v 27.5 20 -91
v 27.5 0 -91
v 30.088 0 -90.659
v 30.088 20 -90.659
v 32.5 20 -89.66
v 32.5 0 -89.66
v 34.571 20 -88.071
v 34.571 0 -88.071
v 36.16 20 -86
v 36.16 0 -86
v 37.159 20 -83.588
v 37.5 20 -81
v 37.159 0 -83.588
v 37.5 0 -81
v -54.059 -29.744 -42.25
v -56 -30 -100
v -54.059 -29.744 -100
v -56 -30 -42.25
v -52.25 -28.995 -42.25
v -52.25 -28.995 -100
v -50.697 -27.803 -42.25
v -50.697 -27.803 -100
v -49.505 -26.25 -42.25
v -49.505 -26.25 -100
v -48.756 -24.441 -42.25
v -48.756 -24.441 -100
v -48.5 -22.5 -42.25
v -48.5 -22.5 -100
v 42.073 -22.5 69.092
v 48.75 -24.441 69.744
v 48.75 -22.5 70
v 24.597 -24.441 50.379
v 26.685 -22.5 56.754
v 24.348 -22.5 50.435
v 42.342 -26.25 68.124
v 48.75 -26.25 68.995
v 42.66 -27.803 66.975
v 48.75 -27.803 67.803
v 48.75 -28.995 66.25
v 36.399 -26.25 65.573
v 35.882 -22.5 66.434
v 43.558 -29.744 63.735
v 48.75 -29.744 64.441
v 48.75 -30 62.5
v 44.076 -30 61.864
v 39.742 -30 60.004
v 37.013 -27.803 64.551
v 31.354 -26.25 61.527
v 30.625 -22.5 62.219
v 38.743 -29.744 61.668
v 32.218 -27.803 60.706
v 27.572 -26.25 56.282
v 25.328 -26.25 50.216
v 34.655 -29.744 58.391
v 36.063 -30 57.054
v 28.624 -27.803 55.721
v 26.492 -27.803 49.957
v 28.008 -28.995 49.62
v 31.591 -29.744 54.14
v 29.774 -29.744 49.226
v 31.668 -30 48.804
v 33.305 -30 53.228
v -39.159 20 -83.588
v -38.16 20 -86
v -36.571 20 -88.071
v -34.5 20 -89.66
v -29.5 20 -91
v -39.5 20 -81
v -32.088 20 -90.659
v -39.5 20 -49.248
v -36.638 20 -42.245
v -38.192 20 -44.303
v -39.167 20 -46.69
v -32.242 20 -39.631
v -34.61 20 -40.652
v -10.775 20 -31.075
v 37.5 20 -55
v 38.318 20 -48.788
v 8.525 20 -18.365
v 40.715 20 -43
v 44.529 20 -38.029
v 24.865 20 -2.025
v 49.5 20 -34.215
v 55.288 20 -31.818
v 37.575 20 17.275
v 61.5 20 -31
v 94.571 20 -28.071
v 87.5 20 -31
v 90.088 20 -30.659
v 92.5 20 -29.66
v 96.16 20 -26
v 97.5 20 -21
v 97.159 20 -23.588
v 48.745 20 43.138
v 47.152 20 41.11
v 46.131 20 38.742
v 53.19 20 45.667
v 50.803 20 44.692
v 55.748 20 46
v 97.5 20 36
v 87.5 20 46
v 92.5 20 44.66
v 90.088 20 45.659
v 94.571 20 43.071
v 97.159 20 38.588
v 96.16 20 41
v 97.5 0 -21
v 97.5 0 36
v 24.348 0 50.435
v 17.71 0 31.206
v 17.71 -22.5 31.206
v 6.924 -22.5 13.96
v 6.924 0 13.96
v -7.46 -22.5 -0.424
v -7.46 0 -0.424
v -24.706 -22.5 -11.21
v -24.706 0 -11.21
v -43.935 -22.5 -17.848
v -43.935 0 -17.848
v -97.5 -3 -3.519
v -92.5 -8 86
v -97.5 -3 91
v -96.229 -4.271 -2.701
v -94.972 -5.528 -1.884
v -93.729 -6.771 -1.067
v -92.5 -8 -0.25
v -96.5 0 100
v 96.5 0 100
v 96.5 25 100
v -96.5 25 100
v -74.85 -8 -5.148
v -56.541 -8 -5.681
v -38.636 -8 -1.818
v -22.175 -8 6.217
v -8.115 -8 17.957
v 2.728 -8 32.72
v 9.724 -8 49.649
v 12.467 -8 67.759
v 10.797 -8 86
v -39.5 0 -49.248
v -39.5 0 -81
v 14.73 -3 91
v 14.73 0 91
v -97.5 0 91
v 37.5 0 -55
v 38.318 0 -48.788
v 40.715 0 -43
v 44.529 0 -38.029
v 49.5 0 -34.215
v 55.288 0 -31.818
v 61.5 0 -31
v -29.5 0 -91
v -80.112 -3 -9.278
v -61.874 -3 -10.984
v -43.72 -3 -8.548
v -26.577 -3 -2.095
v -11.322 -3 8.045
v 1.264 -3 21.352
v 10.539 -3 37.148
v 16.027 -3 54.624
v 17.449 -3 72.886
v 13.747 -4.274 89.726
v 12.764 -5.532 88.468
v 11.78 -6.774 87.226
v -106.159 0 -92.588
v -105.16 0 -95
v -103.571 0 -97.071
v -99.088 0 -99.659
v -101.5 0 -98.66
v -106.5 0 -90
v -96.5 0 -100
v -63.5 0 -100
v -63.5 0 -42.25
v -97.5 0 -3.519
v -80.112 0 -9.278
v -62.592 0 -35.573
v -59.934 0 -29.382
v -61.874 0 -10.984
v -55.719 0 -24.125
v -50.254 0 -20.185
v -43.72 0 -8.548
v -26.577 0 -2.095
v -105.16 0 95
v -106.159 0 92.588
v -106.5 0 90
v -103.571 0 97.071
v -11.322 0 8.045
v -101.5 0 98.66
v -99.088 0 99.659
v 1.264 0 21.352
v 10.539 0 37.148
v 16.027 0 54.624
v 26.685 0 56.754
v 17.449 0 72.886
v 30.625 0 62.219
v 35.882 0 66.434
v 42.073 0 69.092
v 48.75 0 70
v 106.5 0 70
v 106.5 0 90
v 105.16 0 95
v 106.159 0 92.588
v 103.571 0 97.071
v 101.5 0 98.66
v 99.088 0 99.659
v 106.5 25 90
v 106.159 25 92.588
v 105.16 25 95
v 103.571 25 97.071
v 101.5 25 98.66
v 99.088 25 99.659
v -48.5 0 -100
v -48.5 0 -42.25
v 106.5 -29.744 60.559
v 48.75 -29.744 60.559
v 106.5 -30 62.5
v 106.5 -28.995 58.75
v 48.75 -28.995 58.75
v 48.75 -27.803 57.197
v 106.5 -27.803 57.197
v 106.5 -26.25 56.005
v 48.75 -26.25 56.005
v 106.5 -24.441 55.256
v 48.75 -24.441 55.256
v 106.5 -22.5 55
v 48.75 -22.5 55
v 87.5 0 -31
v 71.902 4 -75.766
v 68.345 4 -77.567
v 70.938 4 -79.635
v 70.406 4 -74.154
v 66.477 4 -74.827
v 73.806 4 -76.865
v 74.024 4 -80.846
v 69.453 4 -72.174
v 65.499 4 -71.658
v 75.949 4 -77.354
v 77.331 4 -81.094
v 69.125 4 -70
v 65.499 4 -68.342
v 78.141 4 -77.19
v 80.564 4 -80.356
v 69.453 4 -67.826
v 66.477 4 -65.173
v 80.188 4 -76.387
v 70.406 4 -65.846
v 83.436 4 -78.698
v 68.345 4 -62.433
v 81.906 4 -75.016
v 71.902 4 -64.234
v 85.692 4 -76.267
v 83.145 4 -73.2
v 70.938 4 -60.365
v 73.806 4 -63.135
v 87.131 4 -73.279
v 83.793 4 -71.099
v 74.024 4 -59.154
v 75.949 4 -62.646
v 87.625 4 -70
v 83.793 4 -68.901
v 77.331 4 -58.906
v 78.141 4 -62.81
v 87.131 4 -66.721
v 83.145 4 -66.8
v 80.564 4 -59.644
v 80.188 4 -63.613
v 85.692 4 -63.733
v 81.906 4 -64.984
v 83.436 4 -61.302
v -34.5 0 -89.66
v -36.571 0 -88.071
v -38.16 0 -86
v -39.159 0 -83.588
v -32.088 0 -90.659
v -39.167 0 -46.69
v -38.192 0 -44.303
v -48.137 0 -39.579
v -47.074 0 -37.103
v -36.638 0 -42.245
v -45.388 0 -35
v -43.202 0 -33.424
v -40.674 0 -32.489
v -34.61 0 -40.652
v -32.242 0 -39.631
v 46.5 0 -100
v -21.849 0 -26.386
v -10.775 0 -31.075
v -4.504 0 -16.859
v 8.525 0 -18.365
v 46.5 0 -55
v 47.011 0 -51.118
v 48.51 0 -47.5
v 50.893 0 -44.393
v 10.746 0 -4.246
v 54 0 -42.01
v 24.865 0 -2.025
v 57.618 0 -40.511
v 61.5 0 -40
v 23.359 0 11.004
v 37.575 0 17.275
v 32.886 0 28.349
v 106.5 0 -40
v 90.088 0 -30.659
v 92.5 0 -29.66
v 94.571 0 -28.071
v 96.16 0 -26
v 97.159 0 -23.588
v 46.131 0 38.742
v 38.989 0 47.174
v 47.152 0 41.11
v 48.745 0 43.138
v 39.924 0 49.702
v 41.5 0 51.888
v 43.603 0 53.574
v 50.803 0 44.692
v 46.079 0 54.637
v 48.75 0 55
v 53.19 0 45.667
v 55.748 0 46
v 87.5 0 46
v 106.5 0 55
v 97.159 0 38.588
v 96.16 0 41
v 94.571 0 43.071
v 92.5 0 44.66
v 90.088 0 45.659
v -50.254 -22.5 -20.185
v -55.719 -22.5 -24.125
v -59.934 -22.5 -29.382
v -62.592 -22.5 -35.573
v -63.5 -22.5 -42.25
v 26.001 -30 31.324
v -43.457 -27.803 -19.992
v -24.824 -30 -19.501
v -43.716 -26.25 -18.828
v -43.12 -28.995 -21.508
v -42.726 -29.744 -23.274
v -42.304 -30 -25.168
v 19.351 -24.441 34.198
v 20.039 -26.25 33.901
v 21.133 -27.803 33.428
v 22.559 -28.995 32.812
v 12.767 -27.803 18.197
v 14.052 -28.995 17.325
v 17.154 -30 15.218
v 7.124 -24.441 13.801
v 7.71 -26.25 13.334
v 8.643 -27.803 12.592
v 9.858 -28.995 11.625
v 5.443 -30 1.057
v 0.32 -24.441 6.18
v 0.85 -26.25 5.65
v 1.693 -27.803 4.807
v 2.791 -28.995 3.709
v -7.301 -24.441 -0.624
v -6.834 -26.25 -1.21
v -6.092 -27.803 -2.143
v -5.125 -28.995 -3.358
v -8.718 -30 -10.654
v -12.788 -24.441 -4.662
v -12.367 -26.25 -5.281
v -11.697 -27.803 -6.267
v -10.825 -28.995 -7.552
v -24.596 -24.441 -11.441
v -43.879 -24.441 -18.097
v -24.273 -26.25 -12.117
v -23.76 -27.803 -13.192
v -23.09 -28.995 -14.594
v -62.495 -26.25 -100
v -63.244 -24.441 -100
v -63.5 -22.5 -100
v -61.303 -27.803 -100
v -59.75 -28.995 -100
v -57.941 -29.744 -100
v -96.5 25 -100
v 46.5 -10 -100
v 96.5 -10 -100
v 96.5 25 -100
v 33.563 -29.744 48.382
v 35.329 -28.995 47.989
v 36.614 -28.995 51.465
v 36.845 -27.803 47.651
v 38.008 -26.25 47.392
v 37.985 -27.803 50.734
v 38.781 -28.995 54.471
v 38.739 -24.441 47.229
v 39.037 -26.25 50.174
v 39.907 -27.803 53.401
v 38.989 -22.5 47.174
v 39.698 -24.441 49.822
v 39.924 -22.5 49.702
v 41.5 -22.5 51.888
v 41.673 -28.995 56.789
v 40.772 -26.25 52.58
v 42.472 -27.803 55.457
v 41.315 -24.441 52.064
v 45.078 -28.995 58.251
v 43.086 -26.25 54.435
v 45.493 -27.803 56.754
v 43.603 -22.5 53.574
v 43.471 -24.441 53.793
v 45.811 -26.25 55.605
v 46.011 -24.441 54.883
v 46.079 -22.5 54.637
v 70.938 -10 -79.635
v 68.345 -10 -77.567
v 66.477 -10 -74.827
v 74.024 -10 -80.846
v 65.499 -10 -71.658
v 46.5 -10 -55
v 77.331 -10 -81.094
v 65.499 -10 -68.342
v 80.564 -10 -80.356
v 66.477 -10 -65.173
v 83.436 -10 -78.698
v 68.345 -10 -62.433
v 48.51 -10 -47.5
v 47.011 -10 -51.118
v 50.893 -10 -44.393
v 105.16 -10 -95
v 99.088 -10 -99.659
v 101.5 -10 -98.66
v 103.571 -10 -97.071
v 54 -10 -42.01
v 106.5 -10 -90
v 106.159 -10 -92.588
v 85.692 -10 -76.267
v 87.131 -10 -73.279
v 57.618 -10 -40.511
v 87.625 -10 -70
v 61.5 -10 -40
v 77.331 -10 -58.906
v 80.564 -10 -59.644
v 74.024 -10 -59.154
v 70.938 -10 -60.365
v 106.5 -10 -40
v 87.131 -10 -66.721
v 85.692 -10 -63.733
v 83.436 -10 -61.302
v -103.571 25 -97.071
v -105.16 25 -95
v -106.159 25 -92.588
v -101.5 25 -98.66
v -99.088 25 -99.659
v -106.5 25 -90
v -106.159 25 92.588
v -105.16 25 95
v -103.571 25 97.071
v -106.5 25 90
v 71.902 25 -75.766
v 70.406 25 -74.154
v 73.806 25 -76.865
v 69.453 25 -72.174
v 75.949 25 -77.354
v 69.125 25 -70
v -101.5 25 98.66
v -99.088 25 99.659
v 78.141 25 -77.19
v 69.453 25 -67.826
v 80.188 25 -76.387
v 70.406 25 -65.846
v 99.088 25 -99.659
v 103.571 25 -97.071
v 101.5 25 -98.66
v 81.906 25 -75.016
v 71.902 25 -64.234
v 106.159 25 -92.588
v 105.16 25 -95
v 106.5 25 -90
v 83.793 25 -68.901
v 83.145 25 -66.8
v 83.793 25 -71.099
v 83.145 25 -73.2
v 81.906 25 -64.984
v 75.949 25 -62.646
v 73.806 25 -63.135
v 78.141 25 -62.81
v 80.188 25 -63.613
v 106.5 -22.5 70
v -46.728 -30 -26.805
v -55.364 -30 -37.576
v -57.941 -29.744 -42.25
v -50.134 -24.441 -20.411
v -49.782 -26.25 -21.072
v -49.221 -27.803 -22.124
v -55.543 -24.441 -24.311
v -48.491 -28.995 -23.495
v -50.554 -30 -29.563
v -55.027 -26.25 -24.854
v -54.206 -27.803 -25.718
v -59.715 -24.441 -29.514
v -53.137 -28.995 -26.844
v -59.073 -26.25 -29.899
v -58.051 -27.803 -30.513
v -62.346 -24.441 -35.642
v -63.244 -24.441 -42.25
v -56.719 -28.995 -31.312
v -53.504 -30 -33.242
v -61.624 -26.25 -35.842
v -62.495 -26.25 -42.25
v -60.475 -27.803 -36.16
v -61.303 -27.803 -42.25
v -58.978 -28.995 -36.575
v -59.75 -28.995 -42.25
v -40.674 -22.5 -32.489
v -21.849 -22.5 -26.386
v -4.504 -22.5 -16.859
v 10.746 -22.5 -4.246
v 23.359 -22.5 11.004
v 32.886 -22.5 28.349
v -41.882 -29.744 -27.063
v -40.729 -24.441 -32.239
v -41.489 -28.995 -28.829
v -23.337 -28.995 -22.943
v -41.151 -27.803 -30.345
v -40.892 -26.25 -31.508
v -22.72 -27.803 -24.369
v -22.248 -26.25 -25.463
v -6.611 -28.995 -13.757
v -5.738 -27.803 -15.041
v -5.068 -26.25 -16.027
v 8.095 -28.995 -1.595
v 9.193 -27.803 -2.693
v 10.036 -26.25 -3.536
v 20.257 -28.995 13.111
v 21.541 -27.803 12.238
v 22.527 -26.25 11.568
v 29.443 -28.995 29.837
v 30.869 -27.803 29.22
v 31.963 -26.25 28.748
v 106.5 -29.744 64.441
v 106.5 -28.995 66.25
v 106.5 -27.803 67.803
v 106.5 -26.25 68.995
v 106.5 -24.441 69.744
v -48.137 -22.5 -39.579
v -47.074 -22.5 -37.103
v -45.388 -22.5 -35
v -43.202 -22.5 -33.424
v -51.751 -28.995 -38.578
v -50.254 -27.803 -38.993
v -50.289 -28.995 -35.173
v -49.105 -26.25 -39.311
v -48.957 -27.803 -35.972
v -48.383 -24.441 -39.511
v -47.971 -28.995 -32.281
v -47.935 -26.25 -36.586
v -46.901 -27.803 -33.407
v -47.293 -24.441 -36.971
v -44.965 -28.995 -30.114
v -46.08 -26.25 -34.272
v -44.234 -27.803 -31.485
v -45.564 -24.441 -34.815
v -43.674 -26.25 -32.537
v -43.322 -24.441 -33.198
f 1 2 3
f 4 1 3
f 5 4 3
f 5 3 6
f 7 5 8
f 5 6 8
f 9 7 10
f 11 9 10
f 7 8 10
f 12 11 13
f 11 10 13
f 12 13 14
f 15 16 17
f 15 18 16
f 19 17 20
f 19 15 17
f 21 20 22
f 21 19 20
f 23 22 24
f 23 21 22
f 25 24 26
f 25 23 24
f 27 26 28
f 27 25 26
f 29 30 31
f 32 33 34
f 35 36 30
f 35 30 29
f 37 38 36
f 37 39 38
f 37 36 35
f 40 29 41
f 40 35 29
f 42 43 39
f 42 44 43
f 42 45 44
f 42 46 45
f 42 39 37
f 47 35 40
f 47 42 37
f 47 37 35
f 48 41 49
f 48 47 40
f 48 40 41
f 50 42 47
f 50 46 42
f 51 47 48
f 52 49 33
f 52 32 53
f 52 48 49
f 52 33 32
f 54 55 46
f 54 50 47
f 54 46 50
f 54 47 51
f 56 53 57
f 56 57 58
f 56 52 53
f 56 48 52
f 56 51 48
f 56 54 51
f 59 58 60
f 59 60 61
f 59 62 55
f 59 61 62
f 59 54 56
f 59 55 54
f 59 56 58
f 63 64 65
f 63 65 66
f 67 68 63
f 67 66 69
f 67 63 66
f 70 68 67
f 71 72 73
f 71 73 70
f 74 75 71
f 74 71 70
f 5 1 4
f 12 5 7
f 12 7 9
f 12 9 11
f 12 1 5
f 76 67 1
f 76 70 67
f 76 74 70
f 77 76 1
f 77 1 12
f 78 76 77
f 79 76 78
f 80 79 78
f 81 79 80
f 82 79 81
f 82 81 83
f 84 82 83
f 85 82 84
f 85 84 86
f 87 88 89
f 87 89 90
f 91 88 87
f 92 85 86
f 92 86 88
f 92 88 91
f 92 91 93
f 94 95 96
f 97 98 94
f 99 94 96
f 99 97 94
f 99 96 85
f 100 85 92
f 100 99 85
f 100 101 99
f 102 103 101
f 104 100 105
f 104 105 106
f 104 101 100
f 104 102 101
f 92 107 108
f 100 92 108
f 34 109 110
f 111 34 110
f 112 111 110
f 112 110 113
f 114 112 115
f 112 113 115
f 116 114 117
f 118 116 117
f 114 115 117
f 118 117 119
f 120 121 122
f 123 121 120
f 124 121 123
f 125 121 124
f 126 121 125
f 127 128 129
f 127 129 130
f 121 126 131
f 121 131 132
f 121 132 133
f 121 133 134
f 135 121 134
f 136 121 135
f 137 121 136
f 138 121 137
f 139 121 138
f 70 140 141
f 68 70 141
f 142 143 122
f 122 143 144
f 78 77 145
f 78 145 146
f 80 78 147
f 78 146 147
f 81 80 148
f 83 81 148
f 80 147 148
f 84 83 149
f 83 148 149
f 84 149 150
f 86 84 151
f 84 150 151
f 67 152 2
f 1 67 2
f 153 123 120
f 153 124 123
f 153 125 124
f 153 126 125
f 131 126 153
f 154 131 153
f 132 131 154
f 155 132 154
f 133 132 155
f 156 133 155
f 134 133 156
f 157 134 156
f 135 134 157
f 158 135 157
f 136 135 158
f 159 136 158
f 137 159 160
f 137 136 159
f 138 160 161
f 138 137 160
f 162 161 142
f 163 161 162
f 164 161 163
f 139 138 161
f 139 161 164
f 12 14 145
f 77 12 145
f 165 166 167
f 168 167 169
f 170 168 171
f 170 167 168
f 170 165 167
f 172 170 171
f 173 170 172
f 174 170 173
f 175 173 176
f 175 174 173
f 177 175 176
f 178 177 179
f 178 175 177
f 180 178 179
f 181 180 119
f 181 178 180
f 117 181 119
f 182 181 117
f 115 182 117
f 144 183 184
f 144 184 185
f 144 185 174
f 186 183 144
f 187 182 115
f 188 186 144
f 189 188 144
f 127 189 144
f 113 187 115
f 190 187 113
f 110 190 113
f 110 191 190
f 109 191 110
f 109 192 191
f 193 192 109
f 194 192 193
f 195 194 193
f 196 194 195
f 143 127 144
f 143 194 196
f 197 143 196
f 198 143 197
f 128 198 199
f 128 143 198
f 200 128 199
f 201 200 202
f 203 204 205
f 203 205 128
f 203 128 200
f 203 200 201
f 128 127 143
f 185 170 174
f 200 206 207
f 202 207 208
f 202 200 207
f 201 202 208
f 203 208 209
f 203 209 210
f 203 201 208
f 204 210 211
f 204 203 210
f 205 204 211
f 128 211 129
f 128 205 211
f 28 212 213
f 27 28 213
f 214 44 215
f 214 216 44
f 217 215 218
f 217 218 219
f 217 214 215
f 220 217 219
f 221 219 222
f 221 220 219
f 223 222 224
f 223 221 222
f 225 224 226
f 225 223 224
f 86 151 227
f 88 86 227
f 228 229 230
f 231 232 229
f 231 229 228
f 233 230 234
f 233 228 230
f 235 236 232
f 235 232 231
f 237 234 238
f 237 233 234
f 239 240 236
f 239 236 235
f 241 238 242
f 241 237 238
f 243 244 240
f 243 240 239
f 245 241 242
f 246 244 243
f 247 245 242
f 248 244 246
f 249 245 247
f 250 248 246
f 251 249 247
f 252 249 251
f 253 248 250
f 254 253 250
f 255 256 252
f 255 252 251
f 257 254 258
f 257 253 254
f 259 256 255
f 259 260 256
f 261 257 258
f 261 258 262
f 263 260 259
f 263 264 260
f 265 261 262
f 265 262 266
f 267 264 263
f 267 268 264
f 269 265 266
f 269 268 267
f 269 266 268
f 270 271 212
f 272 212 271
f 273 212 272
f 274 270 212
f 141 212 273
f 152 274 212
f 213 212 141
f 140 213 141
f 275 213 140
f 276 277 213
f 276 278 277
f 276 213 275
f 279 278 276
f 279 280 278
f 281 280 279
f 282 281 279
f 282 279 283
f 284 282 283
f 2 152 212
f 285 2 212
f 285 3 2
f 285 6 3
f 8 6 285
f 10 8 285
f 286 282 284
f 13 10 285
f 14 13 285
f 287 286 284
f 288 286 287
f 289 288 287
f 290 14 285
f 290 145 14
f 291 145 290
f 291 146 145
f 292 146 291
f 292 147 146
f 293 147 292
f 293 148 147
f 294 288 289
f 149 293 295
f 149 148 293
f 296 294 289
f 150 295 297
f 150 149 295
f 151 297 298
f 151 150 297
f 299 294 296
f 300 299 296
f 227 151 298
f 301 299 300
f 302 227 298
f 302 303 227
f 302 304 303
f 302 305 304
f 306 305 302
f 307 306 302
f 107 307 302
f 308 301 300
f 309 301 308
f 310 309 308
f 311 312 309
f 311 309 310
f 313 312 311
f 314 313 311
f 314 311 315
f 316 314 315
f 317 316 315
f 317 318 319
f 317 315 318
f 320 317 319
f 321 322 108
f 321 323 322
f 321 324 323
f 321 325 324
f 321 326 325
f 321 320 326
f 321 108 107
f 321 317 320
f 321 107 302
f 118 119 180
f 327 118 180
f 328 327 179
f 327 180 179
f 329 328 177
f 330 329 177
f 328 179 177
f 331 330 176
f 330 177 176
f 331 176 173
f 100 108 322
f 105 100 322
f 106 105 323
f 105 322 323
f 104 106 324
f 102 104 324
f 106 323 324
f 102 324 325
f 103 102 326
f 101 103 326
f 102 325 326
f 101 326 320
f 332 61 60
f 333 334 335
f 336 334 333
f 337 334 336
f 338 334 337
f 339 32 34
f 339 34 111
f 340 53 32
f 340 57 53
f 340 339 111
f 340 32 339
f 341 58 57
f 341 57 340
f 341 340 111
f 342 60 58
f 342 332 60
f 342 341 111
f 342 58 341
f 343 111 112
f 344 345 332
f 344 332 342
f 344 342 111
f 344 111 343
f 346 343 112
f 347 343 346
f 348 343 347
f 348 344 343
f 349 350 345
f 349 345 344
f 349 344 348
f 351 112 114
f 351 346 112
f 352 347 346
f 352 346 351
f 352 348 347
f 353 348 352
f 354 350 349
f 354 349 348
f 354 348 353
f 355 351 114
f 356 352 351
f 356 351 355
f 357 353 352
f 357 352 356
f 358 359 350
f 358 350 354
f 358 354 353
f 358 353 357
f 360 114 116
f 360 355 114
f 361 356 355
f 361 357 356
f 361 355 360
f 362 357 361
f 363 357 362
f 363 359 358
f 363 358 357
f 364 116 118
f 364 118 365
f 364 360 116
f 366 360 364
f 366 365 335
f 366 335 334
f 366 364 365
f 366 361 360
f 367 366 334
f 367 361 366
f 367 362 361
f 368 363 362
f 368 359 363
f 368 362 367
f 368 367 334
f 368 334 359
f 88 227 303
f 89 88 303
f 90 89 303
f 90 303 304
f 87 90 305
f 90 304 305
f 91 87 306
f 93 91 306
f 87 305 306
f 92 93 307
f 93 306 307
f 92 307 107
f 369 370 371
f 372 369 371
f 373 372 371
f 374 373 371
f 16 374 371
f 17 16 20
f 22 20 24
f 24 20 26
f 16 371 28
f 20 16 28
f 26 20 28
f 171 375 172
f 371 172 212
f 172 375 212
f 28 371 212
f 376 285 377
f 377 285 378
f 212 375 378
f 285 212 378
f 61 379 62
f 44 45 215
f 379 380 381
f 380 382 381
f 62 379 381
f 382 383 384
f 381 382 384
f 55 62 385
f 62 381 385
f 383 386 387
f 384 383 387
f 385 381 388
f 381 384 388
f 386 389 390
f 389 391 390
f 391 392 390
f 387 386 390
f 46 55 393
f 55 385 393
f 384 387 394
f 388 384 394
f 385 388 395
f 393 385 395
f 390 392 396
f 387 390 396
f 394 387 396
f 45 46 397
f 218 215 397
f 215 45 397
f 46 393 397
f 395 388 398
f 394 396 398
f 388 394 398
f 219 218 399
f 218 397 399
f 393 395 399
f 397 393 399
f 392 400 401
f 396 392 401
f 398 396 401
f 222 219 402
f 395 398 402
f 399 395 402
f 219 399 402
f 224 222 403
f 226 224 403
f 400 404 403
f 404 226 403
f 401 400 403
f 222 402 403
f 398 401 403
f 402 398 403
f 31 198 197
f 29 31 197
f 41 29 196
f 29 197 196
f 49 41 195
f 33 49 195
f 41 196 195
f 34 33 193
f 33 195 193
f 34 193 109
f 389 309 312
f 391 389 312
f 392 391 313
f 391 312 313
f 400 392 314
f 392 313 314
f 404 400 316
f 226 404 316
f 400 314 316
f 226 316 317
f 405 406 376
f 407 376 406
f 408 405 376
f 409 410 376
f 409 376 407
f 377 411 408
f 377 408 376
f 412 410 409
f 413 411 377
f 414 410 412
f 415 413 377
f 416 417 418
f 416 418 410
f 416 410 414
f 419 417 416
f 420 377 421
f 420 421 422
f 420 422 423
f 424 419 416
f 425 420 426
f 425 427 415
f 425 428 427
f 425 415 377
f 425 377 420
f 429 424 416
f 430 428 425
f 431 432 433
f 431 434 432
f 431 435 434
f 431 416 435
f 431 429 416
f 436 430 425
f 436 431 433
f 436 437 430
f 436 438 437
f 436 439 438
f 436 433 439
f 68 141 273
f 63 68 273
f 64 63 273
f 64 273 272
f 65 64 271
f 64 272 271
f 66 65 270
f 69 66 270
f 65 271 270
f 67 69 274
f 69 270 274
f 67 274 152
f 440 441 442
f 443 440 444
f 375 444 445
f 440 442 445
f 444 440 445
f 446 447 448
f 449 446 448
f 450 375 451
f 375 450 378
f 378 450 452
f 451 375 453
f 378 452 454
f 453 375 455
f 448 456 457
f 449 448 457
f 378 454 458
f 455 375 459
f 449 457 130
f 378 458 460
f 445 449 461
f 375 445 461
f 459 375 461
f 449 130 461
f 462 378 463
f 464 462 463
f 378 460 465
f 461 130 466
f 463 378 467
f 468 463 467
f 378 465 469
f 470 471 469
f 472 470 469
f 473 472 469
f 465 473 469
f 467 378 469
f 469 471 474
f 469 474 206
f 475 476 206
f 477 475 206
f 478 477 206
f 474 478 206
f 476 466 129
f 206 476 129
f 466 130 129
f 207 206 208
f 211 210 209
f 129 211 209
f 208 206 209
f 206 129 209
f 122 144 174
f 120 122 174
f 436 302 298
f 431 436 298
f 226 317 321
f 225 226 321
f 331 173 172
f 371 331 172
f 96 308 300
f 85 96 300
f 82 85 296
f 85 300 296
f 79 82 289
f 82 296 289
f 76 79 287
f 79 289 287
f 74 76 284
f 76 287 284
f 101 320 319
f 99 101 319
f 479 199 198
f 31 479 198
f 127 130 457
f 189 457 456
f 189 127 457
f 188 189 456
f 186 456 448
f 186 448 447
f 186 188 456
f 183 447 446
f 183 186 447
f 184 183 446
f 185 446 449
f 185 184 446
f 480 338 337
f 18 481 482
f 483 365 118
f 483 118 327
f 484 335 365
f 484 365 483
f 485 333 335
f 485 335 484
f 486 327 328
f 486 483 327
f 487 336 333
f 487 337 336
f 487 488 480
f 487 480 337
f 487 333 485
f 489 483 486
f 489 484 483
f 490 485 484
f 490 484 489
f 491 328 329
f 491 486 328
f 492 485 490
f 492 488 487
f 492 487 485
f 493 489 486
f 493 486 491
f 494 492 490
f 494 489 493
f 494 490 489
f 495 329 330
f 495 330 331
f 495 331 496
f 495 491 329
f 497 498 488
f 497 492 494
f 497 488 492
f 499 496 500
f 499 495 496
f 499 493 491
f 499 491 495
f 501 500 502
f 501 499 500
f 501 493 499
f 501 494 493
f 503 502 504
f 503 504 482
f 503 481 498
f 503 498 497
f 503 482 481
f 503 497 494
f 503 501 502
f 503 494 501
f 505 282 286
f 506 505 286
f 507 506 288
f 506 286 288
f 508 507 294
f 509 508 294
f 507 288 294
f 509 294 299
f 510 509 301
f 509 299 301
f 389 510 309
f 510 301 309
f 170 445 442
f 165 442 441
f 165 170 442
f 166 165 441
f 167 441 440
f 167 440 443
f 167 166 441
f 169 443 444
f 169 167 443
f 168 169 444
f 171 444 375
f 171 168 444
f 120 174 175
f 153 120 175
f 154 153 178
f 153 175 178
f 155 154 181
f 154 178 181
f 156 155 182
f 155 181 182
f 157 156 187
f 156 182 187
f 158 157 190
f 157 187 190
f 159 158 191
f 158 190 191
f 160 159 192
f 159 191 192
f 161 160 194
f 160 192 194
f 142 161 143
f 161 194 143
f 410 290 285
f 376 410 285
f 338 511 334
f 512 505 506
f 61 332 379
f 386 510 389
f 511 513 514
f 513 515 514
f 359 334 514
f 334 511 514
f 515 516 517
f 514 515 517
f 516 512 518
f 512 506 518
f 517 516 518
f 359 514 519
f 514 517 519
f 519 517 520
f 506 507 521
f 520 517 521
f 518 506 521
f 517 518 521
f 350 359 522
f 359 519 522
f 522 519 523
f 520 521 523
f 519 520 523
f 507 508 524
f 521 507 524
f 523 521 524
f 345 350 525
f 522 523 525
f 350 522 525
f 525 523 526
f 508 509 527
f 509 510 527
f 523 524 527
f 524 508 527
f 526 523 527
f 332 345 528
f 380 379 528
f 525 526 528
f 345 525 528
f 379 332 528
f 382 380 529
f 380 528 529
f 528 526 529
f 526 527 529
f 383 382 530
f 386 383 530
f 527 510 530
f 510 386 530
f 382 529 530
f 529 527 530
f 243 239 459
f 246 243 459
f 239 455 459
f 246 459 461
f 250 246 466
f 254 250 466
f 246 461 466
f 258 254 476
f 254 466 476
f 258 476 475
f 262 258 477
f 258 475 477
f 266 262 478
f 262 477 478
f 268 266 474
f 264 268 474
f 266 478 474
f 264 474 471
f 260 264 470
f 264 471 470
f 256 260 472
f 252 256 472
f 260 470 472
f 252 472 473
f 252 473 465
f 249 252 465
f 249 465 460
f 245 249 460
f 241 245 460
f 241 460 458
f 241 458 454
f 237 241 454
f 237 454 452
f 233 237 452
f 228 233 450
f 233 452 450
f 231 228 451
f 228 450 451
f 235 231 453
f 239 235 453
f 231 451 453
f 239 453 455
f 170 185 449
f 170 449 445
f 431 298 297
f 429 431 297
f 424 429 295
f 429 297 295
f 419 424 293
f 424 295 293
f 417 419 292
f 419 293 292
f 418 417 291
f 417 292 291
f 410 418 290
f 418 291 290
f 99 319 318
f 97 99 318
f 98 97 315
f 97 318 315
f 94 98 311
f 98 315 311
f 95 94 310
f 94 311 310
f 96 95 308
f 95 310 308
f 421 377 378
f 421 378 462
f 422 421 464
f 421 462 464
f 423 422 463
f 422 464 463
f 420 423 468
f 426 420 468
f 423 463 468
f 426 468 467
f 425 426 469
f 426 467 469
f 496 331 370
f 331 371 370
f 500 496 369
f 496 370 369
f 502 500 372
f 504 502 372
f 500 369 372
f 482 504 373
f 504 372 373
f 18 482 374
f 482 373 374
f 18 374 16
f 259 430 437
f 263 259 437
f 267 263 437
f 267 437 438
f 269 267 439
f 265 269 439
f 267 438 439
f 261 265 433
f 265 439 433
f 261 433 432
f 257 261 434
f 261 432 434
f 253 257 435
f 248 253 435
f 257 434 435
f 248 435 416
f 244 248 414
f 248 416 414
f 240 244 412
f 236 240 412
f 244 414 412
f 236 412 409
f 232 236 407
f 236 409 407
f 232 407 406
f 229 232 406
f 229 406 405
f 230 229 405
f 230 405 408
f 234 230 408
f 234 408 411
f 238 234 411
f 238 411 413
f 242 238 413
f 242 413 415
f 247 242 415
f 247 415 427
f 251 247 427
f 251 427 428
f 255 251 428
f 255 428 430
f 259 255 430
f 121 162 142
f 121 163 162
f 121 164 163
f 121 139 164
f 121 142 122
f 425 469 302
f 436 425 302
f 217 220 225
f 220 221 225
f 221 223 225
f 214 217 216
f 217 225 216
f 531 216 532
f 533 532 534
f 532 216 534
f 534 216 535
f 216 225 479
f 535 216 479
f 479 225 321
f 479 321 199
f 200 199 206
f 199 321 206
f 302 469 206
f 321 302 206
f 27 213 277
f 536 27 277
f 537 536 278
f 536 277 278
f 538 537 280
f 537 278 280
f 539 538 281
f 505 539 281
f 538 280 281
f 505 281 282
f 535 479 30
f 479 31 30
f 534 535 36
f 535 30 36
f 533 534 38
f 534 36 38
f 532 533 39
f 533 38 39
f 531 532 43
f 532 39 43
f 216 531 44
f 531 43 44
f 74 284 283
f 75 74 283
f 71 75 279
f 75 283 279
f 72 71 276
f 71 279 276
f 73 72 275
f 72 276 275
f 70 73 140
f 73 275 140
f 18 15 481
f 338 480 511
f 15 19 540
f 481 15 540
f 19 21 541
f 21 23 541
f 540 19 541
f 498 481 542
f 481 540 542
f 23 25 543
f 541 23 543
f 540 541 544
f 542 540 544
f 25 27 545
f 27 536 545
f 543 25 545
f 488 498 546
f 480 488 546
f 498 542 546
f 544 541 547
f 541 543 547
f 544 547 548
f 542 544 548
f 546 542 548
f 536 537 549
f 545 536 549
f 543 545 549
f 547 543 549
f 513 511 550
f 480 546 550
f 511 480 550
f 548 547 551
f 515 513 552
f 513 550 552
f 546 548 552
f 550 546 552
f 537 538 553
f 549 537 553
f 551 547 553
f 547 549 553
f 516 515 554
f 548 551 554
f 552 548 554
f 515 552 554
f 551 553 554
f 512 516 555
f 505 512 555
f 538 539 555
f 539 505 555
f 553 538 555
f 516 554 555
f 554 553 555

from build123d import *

# Parameters (mm, degrees)
F1_DEPTH       = 25
F2_DEPTH       = 10
F3_DEPTH       = 30
F4_DEPTH       = 20
F5_DEPTH       = 8
F6_SIZE2       = 5
F6_SIZE        = 5
F8_D           = 14.75
F8_CBORE_D     = 22.25
F8_CBORE_DEPTH = 14
F9_R           = 7.49999


# Not quite as in the source:
# - a fillet or chamfer is up to 0.001 mm smaller than in the source, because OpenCascade refuses the exact size


with BuildPart() as f1:
    # F0 (on Front) → F1 (new body)
    with BuildSketch(Plane.XZ):
        with BuildLine():
            Line((106.5, -40), (106.5, 55))
            Line((106.5, 55), (48.7497216032, 55))
            ThreePointArc((48.7497216032, 55), (42.4942891815, 52.8018949761), (38.9888762464, 47.1739130435))
            ThreePointArc((38.9888762464, 47.1739130435), (10.7462120246, -4.2462120246), (-40.6739130435, -32.4888762464))
            ThreePointArc((-40.6739130435, -32.4888762464), (-46.3018949761, -35.9942891815), (-48.5, -42.2497216032))
            Line((-48.5, -42.2497216032), (-48.5, -100))
            Line((-48.5, -100), (46.5, -100))
            Line((46.5, -100), (46.5, -55))
            ThreePointArc((46.5, -55), (50.8933982822, -44.3933982822), (61.5, -40))
            Line((61.5, -40), (106.5, -40))
        make_face()
        with BuildLine():
            ThreePointArc((-29.5, -91), (-36.5710678119, -88.0710678119), (-39.5, -81))
            Line((-39.5, -81), (-39.5, -49.2476414861))
            ThreePointArc((-39.5, -49.2476414861), (-37.481834214, -43.2234965193), (-32.2419354839, -39.630896205))
            ThreePointArc((-32.2419354839, -39.630896205), (17.1101730553, -10.6101730553), (46.130896205, 38.7419354839))
            ThreePointArc((46.130896205, 38.7419354839), (49.7234965193, 43.981834214), (55.7476414861, 46))
            Line((55.7476414861, 46), (87.5, 46))
            ThreePointArc((87.5, 46), (94.5710678119, 43.0710678119), (97.5, 36))
            Line((97.5, 36), (97.5, -21))
            ThreePointArc((97.5, -21), (94.5710678119, -28.0710678119), (87.5, -31))
            Line((87.5, -31), (61.5, -31))
            ThreePointArc((61.5, -31), (44.5294372515, -38.0294372515), (37.5, -55))
            Line((37.5, -55), (37.5, -81))
            ThreePointArc((37.5, -81), (34.5710678119, -88.0710678119), (27.5, -91))
            Line((27.5, -91), (-29.5, -91))
        make_face(mode=Mode.SUBTRACT)
        with BuildLine():
            Line((96.5, 100), (-96.5, 100))
            ThreePointArc((-96.5, 100), (-103.5710678119, 97.0710678119), (-106.5, 90))
            Line((-106.5, 90), (-106.5, -90))
            ThreePointArc((-106.5, -90), (-103.5710678119, -97.0710678119), (-96.5, -100))
            Line((-96.5, -100), (-63.5, -100))
            Line((-63.5, -100), (-63.5, -42.2497216032))
            ThreePointArc((-63.5, -42.2497216032), (-58.0047374401, -26.6111405489), (-43.9347826087, -17.8476082112))
            ThreePointArc((-43.9347826087, -17.8476082112), (0.1396103068, 6.3603896932), (24.3476082112, 50.4347826087))
            ThreePointArc((24.3476082112, 50.4347826087), (33.1111405489, 64.5047374401), (48.7497216032, 70))
            Line((48.7497216032, 70), (106.5, 70))
            Line((106.5, 70), (106.5, 90))
            ThreePointArc((106.5, 90), (103.5710678119, 97.0710678119), (96.5, 100))
        make_face()
        with BuildLine():
            ThreePointArc((14.7304288624, 91), (-11.3221396288, 8.044605666), (-97.5, -3.5187051029))
            Line((-97.5, -3.5187051029), (-97.5, 91))
            Line((-97.5, 91), (14.7304288624, 91))
        make_face(mode=Mode.SUBTRACT)
        with BuildLine():
            Line((-97.5, 91), (-97.5, -3.5187051029))
            ThreePointArc((-97.5, -3.5187051029), (-11.3221396288, 8.044605666), (14.7304288624, 91))
            Line((14.7304288624, 91), (-97.5, 91))
        make_face()
        with BuildLine():
            Line((-39.5, -49.2476414861), (-39.5, -81))
            ThreePointArc((-39.5, -81), (-36.5710678119, -88.0710678119), (-29.5, -91))
            Line((-29.5, -91), (27.5, -91))
            ThreePointArc((27.5, -91), (34.5710678119, -88.0710678119), (37.5, -81))
            Line((37.5, -81), (37.5, -55))
            ThreePointArc((37.5, -55), (44.5294372515, -38.0294372515), (61.5, -31))
            Line((61.5, -31), (87.5, -31))
            ThreePointArc((87.5, -31), (94.5710678119, -28.0710678119), (97.5, -21))
            Line((97.5, -21), (97.5, 36))
            ThreePointArc((97.5, 36), (94.5710678119, 43.0710678119), (87.5, 46))
            Line((87.5, 46), (55.7476414861, 46))
            ThreePointArc((55.7476414861, 46), (49.7234965193, 43.981834214), (46.130896205, 38.7419354839))
            ThreePointArc((46.130896205, 38.7419354839), (17.1101730553, -10.6101730553), (-32.2419354839, -39.630896205))
            ThreePointArc((-32.2419354839, -39.630896205), (-37.481834214, -43.2234965193), (-39.5, -49.2476414861))
        make_face()
        with BuildLine():
            Line((106.5, 55), (106.5, 70))
            Line((106.5, 70), (48.7497216032, 70))
            ThreePointArc((48.7497216032, 70), (33.1111405489, 64.5047374401), (24.3476082112, 50.4347826087))
            ThreePointArc((24.3476082112, 50.4347826087), (0.1396103068, 6.3603896932), (-43.9347826087, -17.8476082112))
            ThreePointArc((-43.9347826087, -17.8476082112), (-58.0047374401, -26.6111405489), (-63.5, -42.2497216032))
            Line((-63.5, -42.2497216032), (-63.5, -100))
            Line((-63.5, -100), (-48.5, -100))
            Line((-48.5, -100), (-48.5, -42.2497216032))
            ThreePointArc((-48.5, -42.2497216032), (-46.3018949761, -35.9942891815), (-40.6739130435, -32.4888762464))
            ThreePointArc((-40.6739130435, -32.4888762464), (10.7462120246, -4.2462120246), (38.9888762464, 47.1739130435))
            ThreePointArc((38.9888762464, 47.1739130435), (42.4942891815, 52.8018949761), (48.7497216032, 55))
            Line((48.7497216032, 55), (106.5, 55))
        make_face()
        with BuildLine():
            Line((106.5, -90), (106.5, -40))
            Line((106.5, -40), (61.5, -40))
            ThreePointArc((61.5, -40), (50.8933982822, -44.3933982822), (46.5, -55))
            Line((46.5, -55), (46.5, -100))
            Line((46.5, -100), (96.5, -100))
            ThreePointArc((96.5, -100), (103.5710678119, -97.0710678119), (106.5, -90))
        make_face()
    extrude(amount=-F1_DEPTH)

    # F0 (on Front) → F2 (join)
    with BuildSketch(Plane.XZ):
        with BuildLine():
            Line((106.5, -90), (106.5, -40))
            Line((106.5, -40), (61.5, -40))
            ThreePointArc((61.5, -40), (50.8933982822, -44.3933982822), (46.5, -55))
            Line((46.5, -55), (46.5, -100))
            Line((46.5, -100), (96.5, -100))
            ThreePointArc((96.5, -100), (103.5710678119, -97.0710678119), (106.5, -90))
        make_face()
    extrude(amount=F2_DEPTH)

    # F0 (on Front) → F3 (join)
    with BuildSketch(Plane.XZ):
        with BuildLine():
            Line((106.5, 55), (106.5, 70))
            Line((106.5, 70), (48.7497216032, 70))
            ThreePointArc((48.7497216032, 70), (33.1111405489, 64.5047374401), (24.3476082112, 50.4347826087))
            ThreePointArc((24.3476082112, 50.4347826087), (0.1396103068, 6.3603896932), (-43.9347826087, -17.8476082112))
            ThreePointArc((-43.9347826087, -17.8476082112), (-58.0047374401, -26.6111405489), (-63.5, -42.2497216032))
            Line((-63.5, -42.2497216032), (-63.5, -100))
            Line((-63.5, -100), (-48.5, -100))
            Line((-48.5, -100), (-48.5, -42.2497216032))
            ThreePointArc((-48.5, -42.2497216032), (-46.3018949761, -35.9942891815), (-40.6739130435, -32.4888762464))
            ThreePointArc((-40.6739130435, -32.4888762464), (10.7462120246, -4.2462120246), (38.9888762464, 47.1739130435))
            ThreePointArc((38.9888762464, 47.1739130435), (42.4942891815, 52.8018949761), (48.7497216032, 55))
            Line((48.7497216032, 55), (106.5, 55))
        make_face()
    extrude(amount=F3_DEPTH)

    # F0 (on Front) → F4 (cut)
    with BuildSketch(Plane.XZ):
        with BuildLine():
            Line((-39.5, -49.2476414861), (-39.5, -81))
            ThreePointArc((-39.5, -81), (-36.5710678119, -88.0710678119), (-29.5, -91))
            Line((-29.5, -91), (27.5, -91))
            ThreePointArc((27.5, -91), (34.5710678119, -88.0710678119), (37.5, -81))
            Line((37.5, -81), (37.5, -55))
            ThreePointArc((37.5, -55), (44.5294372515, -38.0294372515), (61.5, -31))
            Line((61.5, -31), (87.5, -31))
            ThreePointArc((87.5, -31), (94.5710678119, -28.0710678119), (97.5, -21))
            Line((97.5, -21), (97.5, 36))
            ThreePointArc((97.5, 36), (94.5710678119, 43.0710678119), (87.5, 46))
            Line((87.5, 46), (55.7476414861, 46))
            ThreePointArc((55.7476414861, 46), (49.7234965193, 43.981834214), (46.130896205, 38.7419354839))
            ThreePointArc((46.130896205, 38.7419354839), (17.1101730553, -10.6101730553), (-32.2419354839, -39.630896205))
            ThreePointArc((-32.2419354839, -39.630896205), (-37.481834214, -43.2234965193), (-39.5, -49.2476414861))
        make_face()
    extrude(amount=-F4_DEPTH, mode=Mode.SUBTRACT)

    # F0 (on Front) → F5 (join)
    with BuildSketch(Plane.XZ):
        with BuildLine():
            Line((-97.5, 91), (-97.5, -3.5187051029))
            ThreePointArc((-97.5, -3.5187051029), (-11.3221396288, 8.044605666), (14.7304288624, 91))
            Line((14.7304288624, 91), (-97.5, 91))
        make_face()
    extrude(amount=F5_DEPTH)

    # F6
    f6_edges = [f1.edges().sort_by_distance(p)[0] for p in [
        (-41.384786, -8, 91),
        (-97.5, -8, 43.740647),
        (-11.32214, -8, 8.044606),
    ]]
    chamfer(f6_edges, length=F6_SIZE, length2=F6_SIZE2)

    # F8 (through all)
    with Locations(Plane.XZ.offset(10)):
        with Locations((76.5, -70)):
            CounterBoreHole(F8_D / 2, F8_CBORE_D / 2, F8_CBORE_DEPTH)

    # F9 (radius 7.5 in the source; OpenCascade refuses exactly that, so slightly less here)
    f9_edges = [f1.edges().sort_by_distance(p)[0] for p in [
        (-48.5, -30, -71.124861),
        (-63.5, -30, -71.124861),
    ]]
    fillet(f9_edges, radius=F9_R)


solid = f1.part
